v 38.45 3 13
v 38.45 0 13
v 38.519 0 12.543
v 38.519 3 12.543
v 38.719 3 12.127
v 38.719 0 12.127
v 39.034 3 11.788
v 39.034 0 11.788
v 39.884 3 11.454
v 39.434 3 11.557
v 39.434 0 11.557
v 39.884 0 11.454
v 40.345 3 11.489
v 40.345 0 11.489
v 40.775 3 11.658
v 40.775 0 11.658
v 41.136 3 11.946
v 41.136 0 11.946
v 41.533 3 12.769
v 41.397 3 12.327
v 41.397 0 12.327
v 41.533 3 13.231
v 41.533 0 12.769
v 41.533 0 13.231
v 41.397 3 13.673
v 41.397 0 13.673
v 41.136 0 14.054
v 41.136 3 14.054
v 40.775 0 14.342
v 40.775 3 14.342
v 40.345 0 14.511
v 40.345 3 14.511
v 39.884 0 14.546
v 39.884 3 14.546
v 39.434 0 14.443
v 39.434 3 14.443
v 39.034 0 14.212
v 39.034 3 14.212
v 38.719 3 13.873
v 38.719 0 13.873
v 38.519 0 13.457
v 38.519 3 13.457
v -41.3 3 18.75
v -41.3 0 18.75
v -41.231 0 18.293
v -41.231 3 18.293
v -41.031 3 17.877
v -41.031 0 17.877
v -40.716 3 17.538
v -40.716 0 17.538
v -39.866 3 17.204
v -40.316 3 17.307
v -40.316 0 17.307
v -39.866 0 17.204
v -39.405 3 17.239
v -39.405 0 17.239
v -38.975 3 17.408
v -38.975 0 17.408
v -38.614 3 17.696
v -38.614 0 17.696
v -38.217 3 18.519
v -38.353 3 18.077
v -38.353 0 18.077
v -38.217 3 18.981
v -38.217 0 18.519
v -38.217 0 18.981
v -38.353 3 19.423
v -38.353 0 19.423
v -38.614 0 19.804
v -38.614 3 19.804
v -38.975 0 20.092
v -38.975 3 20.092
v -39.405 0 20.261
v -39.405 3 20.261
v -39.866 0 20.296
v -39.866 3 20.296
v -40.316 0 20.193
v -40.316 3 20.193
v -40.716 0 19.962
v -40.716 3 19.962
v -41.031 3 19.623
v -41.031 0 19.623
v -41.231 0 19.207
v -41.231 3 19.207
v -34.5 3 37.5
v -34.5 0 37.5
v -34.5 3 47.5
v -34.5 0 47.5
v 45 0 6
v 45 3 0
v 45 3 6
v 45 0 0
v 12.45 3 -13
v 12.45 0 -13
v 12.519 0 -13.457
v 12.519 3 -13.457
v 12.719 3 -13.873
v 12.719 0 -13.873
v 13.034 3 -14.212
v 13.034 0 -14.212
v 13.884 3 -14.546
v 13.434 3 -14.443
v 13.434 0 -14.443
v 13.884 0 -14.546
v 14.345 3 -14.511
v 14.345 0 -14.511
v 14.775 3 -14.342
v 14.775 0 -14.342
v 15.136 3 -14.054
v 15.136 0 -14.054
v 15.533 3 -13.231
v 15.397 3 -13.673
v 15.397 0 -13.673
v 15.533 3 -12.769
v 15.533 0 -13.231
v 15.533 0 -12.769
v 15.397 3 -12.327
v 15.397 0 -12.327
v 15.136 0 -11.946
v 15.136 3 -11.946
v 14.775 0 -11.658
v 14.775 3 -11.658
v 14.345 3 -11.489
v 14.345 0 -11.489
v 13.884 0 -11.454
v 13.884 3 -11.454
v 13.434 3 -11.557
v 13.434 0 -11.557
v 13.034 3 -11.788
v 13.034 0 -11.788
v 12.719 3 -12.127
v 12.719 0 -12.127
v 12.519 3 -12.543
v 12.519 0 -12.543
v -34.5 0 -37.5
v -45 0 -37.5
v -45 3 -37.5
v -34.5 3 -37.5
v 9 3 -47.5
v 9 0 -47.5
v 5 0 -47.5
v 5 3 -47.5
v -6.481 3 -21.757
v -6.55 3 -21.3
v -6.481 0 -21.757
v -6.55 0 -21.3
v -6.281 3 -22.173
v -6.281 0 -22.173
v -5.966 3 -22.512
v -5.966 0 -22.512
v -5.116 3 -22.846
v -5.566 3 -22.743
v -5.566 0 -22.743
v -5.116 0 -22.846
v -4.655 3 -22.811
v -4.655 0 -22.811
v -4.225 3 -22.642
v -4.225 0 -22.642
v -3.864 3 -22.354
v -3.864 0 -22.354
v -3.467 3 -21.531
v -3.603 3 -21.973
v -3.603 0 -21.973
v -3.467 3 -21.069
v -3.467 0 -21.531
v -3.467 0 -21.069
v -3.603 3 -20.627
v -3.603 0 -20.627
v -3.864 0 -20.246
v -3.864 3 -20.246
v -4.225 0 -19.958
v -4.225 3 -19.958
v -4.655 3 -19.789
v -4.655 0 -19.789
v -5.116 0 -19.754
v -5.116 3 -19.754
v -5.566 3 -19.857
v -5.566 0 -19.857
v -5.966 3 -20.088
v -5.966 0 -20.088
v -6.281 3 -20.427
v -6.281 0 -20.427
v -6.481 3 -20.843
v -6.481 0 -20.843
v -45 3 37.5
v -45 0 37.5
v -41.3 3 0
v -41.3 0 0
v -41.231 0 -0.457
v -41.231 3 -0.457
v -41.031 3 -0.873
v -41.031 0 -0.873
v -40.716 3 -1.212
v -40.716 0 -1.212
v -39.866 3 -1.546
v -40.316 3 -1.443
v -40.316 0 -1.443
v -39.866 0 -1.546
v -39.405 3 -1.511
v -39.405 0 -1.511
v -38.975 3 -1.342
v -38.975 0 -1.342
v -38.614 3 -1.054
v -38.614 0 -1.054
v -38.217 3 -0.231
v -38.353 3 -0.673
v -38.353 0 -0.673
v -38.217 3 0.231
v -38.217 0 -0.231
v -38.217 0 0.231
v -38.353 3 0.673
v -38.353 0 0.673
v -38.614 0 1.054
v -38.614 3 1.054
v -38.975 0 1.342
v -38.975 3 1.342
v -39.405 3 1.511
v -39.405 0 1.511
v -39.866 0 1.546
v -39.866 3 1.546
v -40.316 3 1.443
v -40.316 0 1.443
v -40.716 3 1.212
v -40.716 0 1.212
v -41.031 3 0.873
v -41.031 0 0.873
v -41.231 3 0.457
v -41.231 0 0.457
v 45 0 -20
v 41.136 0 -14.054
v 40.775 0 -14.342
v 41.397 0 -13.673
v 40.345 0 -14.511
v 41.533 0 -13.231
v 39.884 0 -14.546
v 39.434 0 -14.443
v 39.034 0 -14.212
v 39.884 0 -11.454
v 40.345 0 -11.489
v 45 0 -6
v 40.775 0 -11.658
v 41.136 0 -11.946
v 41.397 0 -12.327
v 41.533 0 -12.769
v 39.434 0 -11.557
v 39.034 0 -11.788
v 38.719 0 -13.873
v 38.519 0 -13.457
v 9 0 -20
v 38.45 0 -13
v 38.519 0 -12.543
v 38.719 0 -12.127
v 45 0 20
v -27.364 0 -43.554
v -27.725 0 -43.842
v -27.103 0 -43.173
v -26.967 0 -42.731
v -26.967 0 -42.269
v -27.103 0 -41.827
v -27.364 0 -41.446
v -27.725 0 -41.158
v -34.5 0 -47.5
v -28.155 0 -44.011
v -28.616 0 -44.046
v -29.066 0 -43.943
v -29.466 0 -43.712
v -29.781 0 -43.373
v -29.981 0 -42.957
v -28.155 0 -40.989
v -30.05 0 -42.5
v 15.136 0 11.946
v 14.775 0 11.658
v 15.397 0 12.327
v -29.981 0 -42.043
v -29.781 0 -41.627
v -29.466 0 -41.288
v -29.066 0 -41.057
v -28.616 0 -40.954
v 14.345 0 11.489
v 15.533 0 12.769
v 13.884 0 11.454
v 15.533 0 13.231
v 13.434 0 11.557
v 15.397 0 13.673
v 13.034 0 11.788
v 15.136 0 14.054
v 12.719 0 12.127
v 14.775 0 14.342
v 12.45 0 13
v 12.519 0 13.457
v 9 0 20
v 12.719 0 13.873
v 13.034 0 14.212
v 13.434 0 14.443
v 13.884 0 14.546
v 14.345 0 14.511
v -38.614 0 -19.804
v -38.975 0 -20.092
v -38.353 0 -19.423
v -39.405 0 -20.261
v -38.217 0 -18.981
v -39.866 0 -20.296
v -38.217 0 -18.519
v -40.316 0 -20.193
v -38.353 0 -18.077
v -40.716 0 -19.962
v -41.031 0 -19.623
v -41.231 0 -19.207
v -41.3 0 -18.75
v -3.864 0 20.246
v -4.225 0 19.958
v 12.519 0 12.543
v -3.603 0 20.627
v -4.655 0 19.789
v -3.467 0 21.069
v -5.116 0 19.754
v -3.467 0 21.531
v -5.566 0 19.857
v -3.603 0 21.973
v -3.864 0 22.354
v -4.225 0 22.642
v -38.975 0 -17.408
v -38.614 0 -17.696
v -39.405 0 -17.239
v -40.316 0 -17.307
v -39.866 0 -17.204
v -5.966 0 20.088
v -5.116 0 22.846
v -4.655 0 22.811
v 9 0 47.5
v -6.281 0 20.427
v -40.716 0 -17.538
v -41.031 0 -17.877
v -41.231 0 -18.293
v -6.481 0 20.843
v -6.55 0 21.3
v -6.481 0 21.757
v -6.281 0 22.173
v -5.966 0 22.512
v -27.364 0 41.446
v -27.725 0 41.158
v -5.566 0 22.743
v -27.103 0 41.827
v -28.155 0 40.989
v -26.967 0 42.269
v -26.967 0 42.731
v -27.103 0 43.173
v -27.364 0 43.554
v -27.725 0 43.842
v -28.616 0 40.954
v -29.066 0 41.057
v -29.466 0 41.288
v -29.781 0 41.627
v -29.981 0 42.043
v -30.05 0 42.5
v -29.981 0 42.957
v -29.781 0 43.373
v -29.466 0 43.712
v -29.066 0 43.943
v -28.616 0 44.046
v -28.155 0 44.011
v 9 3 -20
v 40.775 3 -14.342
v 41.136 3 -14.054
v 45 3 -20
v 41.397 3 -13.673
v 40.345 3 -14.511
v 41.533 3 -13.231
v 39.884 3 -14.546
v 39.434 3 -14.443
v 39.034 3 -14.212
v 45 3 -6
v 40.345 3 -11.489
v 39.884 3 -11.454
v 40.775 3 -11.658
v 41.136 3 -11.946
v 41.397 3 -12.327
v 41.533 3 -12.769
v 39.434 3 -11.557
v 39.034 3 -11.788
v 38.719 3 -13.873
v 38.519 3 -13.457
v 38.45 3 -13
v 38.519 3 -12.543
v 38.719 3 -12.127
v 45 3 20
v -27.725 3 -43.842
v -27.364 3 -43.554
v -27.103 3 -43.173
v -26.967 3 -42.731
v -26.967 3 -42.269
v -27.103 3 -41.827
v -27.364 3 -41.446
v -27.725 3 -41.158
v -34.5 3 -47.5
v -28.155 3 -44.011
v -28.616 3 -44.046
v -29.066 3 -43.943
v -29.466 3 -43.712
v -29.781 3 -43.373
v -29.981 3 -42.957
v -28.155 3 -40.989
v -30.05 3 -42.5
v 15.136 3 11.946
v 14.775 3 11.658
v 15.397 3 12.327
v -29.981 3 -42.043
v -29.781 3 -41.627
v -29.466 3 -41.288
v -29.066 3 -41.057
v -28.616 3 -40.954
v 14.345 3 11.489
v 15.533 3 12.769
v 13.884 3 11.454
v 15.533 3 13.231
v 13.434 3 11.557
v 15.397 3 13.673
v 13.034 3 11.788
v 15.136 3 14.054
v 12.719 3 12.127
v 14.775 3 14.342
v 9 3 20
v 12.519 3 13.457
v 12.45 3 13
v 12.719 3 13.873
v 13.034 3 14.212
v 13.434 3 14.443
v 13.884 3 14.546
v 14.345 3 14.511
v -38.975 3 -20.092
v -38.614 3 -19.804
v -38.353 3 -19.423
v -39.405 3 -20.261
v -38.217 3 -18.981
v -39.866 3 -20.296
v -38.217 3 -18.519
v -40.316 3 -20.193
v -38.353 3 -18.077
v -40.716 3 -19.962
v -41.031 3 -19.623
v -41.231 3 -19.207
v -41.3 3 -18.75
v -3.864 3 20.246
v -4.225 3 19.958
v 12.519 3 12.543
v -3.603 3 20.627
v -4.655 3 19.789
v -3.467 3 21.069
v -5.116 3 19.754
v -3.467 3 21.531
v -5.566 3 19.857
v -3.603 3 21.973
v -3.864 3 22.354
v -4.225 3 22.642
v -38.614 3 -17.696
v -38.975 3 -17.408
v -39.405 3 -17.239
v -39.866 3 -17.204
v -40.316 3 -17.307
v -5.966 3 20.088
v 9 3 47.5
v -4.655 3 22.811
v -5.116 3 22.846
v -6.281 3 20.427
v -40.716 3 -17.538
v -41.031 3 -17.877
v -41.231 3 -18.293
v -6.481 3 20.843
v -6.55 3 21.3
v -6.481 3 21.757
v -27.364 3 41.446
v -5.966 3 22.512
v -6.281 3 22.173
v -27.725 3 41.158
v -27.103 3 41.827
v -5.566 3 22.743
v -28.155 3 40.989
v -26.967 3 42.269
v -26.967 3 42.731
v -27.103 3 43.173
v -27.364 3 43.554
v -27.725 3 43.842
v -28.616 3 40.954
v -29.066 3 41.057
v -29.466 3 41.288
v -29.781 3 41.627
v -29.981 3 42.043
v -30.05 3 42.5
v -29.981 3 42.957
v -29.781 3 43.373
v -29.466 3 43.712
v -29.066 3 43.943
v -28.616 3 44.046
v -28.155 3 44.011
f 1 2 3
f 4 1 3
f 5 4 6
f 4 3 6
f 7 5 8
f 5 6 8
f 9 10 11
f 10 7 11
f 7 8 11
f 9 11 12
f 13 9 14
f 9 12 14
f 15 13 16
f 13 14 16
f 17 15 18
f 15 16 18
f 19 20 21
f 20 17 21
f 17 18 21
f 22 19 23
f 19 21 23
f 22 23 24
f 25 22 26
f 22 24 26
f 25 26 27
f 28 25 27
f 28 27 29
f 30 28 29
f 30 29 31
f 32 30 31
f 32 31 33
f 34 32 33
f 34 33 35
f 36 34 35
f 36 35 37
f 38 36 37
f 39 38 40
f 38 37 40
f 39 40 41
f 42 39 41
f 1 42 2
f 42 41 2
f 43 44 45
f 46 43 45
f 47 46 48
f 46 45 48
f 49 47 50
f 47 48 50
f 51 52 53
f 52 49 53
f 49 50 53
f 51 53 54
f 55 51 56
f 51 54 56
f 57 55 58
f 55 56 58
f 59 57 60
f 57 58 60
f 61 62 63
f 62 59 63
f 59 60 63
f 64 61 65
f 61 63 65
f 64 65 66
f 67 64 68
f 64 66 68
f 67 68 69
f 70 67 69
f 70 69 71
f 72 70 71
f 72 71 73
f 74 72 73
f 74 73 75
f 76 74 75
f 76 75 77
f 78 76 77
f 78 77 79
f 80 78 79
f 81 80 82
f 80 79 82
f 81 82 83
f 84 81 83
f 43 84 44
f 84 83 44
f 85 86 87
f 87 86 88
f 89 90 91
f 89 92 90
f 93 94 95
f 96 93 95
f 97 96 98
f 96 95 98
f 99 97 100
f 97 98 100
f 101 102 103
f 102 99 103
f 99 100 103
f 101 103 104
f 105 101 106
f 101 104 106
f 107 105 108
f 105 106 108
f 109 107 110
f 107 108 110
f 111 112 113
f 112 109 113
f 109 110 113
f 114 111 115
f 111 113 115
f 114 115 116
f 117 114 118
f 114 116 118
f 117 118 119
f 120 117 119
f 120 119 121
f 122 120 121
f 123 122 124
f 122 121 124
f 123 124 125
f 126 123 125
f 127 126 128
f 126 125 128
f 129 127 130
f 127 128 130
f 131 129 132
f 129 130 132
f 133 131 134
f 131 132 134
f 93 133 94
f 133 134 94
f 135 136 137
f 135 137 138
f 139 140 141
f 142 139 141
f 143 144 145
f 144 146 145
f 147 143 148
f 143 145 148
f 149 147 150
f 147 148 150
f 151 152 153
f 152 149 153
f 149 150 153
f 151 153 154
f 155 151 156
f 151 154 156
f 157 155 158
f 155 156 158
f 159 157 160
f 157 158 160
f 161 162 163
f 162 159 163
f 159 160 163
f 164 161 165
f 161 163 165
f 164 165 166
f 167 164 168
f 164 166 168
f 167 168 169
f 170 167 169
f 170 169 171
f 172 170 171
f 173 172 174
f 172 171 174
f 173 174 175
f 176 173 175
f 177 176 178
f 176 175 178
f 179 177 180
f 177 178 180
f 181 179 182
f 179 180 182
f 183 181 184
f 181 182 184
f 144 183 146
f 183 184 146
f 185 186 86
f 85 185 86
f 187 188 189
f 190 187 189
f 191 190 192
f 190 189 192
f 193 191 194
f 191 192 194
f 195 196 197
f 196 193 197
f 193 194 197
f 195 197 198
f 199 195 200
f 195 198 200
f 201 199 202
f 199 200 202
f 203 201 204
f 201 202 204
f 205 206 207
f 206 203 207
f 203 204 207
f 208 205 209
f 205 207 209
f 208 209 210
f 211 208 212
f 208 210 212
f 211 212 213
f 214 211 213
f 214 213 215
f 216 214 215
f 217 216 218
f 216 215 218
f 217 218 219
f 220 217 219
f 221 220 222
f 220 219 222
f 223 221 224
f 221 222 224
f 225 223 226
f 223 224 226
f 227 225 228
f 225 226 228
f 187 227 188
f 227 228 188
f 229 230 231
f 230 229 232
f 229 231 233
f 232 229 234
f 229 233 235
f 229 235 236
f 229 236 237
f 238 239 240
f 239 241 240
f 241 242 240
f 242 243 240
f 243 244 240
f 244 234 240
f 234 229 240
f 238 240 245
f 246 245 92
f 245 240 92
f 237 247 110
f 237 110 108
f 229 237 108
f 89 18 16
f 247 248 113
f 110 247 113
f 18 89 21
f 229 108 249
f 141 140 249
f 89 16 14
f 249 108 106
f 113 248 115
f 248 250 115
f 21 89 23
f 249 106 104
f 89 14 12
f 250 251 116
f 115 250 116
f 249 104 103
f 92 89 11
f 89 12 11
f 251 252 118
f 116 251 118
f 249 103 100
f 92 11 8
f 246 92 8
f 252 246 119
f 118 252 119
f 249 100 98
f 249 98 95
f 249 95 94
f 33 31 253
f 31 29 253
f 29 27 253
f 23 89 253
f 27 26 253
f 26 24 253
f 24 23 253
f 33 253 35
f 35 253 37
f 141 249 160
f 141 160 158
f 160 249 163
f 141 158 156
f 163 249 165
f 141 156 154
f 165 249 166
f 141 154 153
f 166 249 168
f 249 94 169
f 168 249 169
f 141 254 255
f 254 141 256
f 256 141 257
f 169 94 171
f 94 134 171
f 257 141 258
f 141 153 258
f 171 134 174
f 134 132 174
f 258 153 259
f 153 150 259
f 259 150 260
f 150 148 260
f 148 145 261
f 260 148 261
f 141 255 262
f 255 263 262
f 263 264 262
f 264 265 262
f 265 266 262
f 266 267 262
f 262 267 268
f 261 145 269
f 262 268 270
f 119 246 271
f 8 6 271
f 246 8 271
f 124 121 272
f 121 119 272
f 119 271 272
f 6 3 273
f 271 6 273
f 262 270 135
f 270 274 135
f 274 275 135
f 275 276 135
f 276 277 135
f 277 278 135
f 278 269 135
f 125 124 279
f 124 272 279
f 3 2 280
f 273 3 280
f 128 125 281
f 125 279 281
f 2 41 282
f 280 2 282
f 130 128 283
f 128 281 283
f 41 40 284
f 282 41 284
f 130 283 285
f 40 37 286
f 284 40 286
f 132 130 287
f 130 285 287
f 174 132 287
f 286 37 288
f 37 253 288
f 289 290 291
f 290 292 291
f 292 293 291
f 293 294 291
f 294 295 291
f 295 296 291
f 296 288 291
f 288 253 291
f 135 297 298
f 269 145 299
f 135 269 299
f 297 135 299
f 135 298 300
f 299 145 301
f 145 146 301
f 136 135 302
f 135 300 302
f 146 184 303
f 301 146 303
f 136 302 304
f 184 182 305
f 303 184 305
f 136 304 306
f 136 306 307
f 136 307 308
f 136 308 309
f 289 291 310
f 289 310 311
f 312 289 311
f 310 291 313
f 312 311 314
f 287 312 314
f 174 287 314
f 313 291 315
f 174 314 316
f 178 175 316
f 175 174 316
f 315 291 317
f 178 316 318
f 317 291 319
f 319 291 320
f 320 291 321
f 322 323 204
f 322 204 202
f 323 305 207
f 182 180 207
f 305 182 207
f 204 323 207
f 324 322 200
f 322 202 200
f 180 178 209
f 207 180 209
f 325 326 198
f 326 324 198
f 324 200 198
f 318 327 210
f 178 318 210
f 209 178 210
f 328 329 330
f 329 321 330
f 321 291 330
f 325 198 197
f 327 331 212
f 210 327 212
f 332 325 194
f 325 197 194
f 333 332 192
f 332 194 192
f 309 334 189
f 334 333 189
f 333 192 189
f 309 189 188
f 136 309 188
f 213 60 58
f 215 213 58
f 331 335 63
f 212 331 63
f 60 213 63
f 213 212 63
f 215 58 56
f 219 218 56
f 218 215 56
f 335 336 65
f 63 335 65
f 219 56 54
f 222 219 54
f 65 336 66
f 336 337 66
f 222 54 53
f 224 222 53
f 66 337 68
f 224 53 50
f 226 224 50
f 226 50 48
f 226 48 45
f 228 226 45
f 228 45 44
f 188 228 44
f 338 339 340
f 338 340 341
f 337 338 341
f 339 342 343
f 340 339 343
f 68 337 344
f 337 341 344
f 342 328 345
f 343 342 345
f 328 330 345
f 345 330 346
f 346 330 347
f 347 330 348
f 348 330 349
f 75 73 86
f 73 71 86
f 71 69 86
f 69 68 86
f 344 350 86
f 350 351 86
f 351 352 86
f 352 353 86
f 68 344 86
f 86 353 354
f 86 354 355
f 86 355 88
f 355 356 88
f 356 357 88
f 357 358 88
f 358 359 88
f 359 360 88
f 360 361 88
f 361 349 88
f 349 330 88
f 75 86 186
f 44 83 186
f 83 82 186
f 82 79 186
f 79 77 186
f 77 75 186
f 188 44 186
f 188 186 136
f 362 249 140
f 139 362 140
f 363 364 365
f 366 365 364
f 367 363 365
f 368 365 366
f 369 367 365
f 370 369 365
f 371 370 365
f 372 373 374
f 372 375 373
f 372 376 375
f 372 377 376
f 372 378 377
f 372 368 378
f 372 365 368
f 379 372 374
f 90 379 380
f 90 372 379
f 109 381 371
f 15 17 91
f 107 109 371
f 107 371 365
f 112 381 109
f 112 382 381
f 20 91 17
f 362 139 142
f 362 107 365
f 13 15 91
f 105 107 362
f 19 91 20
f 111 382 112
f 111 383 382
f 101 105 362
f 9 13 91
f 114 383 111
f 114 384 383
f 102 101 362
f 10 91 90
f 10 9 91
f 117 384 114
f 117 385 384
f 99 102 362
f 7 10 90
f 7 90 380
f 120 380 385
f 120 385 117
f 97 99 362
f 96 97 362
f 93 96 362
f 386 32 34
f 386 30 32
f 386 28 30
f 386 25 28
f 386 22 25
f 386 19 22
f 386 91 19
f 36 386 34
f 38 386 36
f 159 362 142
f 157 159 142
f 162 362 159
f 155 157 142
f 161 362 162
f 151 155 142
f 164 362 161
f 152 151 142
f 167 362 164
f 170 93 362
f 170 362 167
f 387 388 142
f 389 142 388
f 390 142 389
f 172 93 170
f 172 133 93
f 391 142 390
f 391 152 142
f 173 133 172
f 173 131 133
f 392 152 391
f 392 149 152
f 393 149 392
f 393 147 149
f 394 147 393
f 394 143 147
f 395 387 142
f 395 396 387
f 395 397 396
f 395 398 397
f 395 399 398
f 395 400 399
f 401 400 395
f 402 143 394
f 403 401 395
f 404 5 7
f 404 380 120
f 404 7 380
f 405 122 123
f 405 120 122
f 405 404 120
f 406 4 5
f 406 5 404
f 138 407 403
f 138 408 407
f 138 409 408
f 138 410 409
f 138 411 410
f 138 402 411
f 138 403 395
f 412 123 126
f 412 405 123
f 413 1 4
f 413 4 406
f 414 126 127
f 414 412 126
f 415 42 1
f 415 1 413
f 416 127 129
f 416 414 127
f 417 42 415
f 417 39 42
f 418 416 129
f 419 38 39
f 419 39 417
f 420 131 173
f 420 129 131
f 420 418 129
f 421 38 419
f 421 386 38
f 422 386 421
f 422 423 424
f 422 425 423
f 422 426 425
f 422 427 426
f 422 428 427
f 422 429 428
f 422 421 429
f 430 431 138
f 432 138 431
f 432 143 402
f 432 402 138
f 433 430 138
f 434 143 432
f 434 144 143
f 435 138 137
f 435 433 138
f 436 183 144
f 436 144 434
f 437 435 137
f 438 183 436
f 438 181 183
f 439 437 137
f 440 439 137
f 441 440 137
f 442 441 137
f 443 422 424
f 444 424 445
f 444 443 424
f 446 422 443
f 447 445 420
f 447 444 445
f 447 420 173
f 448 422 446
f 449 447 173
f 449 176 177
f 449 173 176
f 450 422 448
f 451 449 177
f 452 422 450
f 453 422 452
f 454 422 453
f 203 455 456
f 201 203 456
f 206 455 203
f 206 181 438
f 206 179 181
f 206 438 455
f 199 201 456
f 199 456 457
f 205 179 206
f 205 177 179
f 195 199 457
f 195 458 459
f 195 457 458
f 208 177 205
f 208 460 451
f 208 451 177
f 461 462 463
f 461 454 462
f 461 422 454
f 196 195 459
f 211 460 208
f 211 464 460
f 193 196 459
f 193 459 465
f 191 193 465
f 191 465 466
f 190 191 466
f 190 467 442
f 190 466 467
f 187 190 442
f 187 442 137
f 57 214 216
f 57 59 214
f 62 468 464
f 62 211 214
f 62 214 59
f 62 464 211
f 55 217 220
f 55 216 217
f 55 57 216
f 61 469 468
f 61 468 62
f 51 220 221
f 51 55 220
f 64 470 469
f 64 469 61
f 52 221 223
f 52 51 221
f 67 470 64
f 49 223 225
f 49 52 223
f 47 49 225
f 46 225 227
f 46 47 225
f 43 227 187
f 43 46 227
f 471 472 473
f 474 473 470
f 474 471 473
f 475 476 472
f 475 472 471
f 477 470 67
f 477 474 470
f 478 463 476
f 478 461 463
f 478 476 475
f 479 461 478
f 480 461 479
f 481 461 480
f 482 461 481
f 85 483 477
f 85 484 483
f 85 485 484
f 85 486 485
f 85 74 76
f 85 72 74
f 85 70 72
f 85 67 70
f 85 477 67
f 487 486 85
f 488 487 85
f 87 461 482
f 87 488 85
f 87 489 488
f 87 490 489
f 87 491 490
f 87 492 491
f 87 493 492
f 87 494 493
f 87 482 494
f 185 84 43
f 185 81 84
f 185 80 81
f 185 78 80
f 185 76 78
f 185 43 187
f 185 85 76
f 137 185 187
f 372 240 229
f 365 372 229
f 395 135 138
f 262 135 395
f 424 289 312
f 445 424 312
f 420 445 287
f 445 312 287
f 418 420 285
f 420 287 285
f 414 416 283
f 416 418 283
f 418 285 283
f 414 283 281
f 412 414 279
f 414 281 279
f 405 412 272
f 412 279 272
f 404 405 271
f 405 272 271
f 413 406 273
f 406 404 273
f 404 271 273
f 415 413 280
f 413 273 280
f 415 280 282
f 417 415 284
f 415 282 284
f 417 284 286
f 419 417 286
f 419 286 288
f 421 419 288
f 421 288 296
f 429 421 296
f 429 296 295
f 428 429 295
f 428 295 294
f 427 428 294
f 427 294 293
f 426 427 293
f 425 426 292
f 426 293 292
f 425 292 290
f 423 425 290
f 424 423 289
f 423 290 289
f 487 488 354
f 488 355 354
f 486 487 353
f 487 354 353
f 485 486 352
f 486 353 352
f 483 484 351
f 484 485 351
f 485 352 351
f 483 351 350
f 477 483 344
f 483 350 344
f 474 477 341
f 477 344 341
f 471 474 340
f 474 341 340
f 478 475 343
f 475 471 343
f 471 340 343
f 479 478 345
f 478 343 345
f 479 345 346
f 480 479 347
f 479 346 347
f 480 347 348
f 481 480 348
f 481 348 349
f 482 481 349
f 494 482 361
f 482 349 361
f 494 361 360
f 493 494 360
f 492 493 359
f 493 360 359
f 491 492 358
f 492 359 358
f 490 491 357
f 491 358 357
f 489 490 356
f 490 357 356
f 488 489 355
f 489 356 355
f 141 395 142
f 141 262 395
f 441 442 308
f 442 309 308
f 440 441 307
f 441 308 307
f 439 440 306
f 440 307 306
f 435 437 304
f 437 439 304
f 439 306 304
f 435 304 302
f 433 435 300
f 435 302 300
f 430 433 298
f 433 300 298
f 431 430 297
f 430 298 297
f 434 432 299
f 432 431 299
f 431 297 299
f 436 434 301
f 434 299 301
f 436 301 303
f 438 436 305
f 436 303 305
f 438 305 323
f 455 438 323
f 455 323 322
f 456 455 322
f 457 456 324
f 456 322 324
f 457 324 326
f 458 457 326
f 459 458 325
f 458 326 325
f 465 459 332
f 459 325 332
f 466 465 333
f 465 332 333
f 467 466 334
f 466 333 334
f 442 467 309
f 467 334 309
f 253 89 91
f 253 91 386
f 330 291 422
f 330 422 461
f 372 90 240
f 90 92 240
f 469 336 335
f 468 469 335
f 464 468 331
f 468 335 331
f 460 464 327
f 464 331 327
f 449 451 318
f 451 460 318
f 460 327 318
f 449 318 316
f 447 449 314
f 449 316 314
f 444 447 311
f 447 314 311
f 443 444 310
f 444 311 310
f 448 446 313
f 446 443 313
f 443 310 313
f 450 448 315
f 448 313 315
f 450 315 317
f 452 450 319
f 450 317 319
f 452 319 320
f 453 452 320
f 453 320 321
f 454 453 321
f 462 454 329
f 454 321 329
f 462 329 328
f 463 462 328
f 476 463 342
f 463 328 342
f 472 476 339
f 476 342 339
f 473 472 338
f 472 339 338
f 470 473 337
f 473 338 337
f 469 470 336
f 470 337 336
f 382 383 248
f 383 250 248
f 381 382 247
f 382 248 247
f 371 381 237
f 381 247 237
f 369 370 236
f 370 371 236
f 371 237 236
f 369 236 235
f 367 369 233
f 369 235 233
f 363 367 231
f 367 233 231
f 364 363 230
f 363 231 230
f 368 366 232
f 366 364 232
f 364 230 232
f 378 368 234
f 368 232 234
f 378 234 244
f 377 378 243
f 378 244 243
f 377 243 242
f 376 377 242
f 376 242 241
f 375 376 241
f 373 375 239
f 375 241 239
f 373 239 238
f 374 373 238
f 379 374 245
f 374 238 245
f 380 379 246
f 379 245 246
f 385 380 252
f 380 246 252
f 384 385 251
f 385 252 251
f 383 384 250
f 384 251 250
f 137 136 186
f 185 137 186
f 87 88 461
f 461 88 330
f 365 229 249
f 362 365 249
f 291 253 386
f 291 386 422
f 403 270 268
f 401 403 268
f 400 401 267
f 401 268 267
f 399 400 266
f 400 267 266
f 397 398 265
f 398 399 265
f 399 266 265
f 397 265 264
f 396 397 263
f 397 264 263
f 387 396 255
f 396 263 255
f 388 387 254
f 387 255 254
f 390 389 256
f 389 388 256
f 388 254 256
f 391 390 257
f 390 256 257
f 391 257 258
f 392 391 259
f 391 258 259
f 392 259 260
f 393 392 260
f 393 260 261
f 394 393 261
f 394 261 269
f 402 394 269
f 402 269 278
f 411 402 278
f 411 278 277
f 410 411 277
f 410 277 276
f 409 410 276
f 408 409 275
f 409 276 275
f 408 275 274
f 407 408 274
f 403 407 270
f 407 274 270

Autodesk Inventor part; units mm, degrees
ref_plane "YZ Plane" through (0, 0, 0) normal (1, 0, 0) x (0, 1, 0)
ref_plane "XZ Plane" through (0, 0, 0) normal (0, 1, 0) x (-1, 0, 0)
ref_plane "XY Plane" through (0, 0, 0) normal (0, 0, 1) x (1, 0, 0)
sketch "Sketch1" plane through (0, 0, 0) normal (0, 1, 0) x (-1, 0, 0)
  line L0 (-45, 0) -> (-45, 6)
  line L1 (-45, 6) -> (-45, -6)
  line L2 (-45, 6) -> (-45, 20)
  line L3 (-45, 20) -> (-45, -6)
  line L4 (-45, -6) -> (-45, -20)
  line L5 (-45, 20) -> (-9, 20)
  line L6 (-45, -20) -> (-9, -20)
  line L7 (-45, -20) -> (-9, -20)
  line L8 (-9, 20) -> (-9, 47.5)
  line L9 (-45, 6) -> (-45, 20)
  circle A0 centre (-14, 13) radius 1.55
  circle A1 centre (-14, -13) radius 1.55
  circle A2 centre (-40, 13) radius 1.55
  circle A3 centre (-40, -13) radius 1.55
  line L10 (-45, 20) -> (-45, -20)
  line L11 (-9, 20) -> (-45, 20)
  line L12 (-45, 20) -> (-45, -20)
  line L13 (-45, -20) -> (-9, -20)
  line L14 (45, 37.5) -> (34.5, 37.5)
  line L15 (45, -37.5) -> (34.5, -37.5)
  line L16 (34.5, -37.5) -> (34.5, -47.5)
  line L17 (34.5, 37.5) -> (34.5, 47.5)
  circle A4 centre (28.5, 42.5) radius 1.55
  circle A5 centre (28.5, -42.5) radius 1.55
  line L18 (34.5, -47.5) -> (-5, -47.5)
  line L19 (45, -37.5) -> (45, 37.5)
  line L20 (34.5, 47.5) -> (-9, 47.5)
  line L21 (-9, -20) -> (-9, -47.5)
  line L22 (-9, -47.5) -> (-5, -47.5)
  circle A6 centre (5, 21.3) radius 1.55
  circle A7 centre (5, -21.3) radius 1.55
  circle A8 centre (39.75, 18.75) radius 1.55
  circle A9 centre (39.75, 0) radius 1.55
  circle A10 centre (39.75, -18.75) radius 1.55
  point P0 (0, 0)
  dimension "d2" = 6
  dimension "d3" = 12
  dimension "d4" = 14
  dimension "d5" = 14
  dimension "d6" = 36
  dimension "d7" = 36
  dimension "d13" = 3.1
  dimension "d14" = 3.1
  dimension "d15" = 3.1
  dimension "d17" = 10.5
  dimension "d19" = 10.5
  dimension "d22" = 3.1
  dimension "d23" = 3.1
  dimension "d27" = 3.1
  dimension "d28" = 3.1
  dimension "d32" = 3.1
  dimension "d33" = 3.1
  dimension "d34" = 3.1
extrude "Extrusion2" add sketch "Sketch1" along normal blind 3
properties part number "basePlate"
